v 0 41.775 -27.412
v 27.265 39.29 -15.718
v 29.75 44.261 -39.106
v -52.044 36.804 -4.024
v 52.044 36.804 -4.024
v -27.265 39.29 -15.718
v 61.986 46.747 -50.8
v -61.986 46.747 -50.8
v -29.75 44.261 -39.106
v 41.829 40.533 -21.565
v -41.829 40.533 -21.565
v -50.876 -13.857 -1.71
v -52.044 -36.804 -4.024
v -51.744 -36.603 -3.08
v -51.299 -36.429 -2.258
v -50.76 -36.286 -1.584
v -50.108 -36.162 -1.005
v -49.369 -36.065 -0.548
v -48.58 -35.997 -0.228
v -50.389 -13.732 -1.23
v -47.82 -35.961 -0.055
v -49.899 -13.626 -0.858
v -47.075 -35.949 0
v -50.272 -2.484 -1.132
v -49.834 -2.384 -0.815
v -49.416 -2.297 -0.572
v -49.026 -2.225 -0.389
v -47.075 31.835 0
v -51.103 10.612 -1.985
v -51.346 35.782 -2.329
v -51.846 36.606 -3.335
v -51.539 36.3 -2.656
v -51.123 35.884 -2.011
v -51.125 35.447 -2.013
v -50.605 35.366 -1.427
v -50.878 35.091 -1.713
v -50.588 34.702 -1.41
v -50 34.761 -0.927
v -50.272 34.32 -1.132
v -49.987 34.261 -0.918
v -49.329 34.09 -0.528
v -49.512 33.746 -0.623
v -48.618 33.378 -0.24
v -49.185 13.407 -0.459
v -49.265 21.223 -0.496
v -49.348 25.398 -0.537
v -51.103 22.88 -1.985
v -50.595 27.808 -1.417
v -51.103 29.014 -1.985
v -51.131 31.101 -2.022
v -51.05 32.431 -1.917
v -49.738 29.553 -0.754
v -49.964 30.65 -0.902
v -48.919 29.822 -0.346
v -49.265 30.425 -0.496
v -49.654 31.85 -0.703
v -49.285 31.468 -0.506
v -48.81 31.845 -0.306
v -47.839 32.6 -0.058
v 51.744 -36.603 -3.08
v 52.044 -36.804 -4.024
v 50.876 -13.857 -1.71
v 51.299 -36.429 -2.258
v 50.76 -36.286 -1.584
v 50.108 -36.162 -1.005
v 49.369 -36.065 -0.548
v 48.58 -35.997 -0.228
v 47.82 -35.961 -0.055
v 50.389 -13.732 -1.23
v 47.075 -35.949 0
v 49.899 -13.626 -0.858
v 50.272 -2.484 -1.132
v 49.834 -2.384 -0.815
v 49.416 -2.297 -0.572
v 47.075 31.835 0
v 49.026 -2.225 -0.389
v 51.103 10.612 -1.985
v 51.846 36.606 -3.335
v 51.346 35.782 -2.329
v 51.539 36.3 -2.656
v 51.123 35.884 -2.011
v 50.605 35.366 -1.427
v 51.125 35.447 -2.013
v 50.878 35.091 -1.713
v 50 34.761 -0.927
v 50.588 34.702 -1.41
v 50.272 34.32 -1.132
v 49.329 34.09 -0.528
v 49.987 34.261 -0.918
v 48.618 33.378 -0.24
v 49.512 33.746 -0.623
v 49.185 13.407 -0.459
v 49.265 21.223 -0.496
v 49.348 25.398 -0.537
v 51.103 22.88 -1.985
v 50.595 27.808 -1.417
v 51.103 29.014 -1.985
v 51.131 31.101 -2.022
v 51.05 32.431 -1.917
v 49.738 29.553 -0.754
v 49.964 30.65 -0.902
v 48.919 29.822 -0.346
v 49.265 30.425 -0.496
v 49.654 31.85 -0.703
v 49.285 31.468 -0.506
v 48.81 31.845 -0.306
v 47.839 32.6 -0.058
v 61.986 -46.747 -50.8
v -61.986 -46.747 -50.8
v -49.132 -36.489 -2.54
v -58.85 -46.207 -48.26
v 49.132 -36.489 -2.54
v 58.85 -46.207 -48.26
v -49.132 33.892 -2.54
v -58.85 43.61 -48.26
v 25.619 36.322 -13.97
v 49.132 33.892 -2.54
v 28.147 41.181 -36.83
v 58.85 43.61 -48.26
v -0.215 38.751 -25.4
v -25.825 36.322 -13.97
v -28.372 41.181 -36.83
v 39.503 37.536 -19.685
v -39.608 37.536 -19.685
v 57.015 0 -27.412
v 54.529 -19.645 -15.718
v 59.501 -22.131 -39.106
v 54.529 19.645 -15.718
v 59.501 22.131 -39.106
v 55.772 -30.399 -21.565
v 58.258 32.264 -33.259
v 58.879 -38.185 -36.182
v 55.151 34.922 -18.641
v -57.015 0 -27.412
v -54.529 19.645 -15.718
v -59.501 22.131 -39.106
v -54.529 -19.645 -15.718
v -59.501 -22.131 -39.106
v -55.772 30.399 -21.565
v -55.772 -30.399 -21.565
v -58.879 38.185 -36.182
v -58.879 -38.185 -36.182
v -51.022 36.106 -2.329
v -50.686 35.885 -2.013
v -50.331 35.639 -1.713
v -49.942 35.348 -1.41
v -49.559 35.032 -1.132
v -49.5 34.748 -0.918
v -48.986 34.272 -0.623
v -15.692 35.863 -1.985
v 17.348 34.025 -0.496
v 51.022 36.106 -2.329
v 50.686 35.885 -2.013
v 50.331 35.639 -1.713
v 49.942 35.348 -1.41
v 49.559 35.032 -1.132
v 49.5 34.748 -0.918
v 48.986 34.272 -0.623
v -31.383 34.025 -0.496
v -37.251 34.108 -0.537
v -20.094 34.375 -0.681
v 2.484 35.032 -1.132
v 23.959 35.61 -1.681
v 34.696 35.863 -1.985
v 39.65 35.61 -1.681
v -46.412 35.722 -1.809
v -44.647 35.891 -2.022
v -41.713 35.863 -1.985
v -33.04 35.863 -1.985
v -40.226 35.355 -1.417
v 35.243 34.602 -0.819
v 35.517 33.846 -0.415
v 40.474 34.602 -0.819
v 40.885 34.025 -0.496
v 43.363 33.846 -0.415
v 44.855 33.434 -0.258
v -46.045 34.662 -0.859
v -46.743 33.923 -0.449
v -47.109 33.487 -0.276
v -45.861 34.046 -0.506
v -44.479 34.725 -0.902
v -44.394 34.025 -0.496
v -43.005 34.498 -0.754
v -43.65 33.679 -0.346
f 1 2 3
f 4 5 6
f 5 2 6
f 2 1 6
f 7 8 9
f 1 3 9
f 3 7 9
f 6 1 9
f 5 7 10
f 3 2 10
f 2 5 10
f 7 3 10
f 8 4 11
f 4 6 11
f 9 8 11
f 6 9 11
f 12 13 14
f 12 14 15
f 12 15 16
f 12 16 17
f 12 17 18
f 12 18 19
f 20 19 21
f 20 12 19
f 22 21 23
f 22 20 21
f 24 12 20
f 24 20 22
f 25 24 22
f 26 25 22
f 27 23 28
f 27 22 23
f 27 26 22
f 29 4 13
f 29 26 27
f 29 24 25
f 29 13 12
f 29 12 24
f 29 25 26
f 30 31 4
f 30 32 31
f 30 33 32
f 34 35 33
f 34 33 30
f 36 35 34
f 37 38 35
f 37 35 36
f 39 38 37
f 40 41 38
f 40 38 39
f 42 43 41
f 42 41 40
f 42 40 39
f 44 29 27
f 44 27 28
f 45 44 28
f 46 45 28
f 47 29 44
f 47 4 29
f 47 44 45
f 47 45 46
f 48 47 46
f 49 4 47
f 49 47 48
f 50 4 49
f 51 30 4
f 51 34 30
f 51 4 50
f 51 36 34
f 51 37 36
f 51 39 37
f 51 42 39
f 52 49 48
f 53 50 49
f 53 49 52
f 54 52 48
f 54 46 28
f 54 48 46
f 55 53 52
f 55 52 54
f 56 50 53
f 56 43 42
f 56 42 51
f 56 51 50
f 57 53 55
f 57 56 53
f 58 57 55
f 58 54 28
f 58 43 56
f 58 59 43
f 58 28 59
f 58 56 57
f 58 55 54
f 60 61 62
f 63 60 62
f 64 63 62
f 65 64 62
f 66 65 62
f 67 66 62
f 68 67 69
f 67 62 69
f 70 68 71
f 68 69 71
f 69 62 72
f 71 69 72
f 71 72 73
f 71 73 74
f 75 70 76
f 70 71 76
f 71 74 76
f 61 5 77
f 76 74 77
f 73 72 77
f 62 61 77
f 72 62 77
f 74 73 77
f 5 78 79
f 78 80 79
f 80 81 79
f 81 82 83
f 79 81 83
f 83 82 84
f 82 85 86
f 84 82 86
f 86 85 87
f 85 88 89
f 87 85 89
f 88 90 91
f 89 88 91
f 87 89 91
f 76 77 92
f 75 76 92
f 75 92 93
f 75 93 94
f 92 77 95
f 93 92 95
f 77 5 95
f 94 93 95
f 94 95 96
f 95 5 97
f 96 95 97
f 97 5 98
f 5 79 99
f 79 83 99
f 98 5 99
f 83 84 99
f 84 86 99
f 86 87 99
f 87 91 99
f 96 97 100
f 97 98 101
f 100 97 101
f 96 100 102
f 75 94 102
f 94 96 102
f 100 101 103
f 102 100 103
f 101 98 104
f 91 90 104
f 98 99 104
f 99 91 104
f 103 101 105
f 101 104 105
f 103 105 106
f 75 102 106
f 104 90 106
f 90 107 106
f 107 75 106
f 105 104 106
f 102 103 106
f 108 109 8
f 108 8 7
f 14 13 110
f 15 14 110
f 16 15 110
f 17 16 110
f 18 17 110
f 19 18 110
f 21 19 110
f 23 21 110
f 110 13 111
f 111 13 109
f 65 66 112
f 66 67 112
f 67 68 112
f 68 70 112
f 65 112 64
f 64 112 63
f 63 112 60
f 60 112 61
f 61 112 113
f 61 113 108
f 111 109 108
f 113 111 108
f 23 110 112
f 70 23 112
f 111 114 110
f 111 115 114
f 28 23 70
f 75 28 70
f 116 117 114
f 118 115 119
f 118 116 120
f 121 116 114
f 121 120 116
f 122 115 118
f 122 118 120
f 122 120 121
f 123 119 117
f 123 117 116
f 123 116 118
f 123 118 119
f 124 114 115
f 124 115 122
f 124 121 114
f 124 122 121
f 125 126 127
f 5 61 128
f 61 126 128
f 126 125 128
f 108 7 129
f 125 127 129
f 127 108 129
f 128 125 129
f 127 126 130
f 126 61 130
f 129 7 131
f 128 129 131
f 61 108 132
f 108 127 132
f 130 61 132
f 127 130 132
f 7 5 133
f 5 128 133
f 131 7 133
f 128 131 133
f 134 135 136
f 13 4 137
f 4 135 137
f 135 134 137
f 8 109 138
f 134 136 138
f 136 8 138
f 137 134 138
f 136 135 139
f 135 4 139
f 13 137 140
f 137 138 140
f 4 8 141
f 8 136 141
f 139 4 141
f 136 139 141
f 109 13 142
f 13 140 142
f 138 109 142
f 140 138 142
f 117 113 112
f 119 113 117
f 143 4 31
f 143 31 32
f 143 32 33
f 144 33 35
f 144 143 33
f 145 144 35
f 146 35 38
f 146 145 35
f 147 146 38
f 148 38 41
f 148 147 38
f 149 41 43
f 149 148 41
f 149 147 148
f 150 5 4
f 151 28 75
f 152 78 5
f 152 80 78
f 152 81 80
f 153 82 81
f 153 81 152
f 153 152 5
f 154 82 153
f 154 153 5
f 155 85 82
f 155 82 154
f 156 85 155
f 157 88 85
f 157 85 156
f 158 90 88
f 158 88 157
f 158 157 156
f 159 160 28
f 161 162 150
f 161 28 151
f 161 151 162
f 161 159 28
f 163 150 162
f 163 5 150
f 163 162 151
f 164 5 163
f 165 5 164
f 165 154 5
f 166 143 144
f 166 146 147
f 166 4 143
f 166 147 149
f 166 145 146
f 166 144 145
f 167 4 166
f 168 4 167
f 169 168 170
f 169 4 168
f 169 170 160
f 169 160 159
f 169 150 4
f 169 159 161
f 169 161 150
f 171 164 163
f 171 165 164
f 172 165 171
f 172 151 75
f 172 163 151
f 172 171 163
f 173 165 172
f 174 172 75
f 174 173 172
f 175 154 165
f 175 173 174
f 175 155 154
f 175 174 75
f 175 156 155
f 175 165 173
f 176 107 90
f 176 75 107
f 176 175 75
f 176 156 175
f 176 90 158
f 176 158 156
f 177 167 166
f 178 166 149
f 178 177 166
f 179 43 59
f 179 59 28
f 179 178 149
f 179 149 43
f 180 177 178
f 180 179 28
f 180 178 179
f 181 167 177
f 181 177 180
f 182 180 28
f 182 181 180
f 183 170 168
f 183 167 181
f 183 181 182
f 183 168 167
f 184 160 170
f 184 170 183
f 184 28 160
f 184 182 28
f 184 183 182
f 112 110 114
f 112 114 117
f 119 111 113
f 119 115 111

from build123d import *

# Parameters (mm, degrees)
F0_W     = 102.3769811426
F0_H     = 71.8978196383
F1_DEPTH = 50.8
F1_TAPER = -12
F2_T     = -2.54
F3_R     = 5.08


with BuildPart() as f1:
    # F0 (on Top) → F1 (new body)
    with BuildSketch(Plane.XY):
        Rectangle(F0_W, F0_H)
    extrude(amount=-F1_DEPTH, taper=F1_TAPER)

    # F2
    f2_openings = [f1.faces().sort_by_distance(p)[0] for p in [
        (0, -41.519548, -26.207794),
    ]]
    offset(amount=F2_T, openings=f2_openings, kind=Kind.INTERSECTION)

    # F3
    f3_edges = [f1.edges().sort_by_distance(p)[0] for p in [
        (51.188491, 0, 0),
        (-51.188491, 0, 0),
        (0, 35.94891, 0),
    ]]
    fillet(f3_edges, radius=F3_R)


solid = f1.part
